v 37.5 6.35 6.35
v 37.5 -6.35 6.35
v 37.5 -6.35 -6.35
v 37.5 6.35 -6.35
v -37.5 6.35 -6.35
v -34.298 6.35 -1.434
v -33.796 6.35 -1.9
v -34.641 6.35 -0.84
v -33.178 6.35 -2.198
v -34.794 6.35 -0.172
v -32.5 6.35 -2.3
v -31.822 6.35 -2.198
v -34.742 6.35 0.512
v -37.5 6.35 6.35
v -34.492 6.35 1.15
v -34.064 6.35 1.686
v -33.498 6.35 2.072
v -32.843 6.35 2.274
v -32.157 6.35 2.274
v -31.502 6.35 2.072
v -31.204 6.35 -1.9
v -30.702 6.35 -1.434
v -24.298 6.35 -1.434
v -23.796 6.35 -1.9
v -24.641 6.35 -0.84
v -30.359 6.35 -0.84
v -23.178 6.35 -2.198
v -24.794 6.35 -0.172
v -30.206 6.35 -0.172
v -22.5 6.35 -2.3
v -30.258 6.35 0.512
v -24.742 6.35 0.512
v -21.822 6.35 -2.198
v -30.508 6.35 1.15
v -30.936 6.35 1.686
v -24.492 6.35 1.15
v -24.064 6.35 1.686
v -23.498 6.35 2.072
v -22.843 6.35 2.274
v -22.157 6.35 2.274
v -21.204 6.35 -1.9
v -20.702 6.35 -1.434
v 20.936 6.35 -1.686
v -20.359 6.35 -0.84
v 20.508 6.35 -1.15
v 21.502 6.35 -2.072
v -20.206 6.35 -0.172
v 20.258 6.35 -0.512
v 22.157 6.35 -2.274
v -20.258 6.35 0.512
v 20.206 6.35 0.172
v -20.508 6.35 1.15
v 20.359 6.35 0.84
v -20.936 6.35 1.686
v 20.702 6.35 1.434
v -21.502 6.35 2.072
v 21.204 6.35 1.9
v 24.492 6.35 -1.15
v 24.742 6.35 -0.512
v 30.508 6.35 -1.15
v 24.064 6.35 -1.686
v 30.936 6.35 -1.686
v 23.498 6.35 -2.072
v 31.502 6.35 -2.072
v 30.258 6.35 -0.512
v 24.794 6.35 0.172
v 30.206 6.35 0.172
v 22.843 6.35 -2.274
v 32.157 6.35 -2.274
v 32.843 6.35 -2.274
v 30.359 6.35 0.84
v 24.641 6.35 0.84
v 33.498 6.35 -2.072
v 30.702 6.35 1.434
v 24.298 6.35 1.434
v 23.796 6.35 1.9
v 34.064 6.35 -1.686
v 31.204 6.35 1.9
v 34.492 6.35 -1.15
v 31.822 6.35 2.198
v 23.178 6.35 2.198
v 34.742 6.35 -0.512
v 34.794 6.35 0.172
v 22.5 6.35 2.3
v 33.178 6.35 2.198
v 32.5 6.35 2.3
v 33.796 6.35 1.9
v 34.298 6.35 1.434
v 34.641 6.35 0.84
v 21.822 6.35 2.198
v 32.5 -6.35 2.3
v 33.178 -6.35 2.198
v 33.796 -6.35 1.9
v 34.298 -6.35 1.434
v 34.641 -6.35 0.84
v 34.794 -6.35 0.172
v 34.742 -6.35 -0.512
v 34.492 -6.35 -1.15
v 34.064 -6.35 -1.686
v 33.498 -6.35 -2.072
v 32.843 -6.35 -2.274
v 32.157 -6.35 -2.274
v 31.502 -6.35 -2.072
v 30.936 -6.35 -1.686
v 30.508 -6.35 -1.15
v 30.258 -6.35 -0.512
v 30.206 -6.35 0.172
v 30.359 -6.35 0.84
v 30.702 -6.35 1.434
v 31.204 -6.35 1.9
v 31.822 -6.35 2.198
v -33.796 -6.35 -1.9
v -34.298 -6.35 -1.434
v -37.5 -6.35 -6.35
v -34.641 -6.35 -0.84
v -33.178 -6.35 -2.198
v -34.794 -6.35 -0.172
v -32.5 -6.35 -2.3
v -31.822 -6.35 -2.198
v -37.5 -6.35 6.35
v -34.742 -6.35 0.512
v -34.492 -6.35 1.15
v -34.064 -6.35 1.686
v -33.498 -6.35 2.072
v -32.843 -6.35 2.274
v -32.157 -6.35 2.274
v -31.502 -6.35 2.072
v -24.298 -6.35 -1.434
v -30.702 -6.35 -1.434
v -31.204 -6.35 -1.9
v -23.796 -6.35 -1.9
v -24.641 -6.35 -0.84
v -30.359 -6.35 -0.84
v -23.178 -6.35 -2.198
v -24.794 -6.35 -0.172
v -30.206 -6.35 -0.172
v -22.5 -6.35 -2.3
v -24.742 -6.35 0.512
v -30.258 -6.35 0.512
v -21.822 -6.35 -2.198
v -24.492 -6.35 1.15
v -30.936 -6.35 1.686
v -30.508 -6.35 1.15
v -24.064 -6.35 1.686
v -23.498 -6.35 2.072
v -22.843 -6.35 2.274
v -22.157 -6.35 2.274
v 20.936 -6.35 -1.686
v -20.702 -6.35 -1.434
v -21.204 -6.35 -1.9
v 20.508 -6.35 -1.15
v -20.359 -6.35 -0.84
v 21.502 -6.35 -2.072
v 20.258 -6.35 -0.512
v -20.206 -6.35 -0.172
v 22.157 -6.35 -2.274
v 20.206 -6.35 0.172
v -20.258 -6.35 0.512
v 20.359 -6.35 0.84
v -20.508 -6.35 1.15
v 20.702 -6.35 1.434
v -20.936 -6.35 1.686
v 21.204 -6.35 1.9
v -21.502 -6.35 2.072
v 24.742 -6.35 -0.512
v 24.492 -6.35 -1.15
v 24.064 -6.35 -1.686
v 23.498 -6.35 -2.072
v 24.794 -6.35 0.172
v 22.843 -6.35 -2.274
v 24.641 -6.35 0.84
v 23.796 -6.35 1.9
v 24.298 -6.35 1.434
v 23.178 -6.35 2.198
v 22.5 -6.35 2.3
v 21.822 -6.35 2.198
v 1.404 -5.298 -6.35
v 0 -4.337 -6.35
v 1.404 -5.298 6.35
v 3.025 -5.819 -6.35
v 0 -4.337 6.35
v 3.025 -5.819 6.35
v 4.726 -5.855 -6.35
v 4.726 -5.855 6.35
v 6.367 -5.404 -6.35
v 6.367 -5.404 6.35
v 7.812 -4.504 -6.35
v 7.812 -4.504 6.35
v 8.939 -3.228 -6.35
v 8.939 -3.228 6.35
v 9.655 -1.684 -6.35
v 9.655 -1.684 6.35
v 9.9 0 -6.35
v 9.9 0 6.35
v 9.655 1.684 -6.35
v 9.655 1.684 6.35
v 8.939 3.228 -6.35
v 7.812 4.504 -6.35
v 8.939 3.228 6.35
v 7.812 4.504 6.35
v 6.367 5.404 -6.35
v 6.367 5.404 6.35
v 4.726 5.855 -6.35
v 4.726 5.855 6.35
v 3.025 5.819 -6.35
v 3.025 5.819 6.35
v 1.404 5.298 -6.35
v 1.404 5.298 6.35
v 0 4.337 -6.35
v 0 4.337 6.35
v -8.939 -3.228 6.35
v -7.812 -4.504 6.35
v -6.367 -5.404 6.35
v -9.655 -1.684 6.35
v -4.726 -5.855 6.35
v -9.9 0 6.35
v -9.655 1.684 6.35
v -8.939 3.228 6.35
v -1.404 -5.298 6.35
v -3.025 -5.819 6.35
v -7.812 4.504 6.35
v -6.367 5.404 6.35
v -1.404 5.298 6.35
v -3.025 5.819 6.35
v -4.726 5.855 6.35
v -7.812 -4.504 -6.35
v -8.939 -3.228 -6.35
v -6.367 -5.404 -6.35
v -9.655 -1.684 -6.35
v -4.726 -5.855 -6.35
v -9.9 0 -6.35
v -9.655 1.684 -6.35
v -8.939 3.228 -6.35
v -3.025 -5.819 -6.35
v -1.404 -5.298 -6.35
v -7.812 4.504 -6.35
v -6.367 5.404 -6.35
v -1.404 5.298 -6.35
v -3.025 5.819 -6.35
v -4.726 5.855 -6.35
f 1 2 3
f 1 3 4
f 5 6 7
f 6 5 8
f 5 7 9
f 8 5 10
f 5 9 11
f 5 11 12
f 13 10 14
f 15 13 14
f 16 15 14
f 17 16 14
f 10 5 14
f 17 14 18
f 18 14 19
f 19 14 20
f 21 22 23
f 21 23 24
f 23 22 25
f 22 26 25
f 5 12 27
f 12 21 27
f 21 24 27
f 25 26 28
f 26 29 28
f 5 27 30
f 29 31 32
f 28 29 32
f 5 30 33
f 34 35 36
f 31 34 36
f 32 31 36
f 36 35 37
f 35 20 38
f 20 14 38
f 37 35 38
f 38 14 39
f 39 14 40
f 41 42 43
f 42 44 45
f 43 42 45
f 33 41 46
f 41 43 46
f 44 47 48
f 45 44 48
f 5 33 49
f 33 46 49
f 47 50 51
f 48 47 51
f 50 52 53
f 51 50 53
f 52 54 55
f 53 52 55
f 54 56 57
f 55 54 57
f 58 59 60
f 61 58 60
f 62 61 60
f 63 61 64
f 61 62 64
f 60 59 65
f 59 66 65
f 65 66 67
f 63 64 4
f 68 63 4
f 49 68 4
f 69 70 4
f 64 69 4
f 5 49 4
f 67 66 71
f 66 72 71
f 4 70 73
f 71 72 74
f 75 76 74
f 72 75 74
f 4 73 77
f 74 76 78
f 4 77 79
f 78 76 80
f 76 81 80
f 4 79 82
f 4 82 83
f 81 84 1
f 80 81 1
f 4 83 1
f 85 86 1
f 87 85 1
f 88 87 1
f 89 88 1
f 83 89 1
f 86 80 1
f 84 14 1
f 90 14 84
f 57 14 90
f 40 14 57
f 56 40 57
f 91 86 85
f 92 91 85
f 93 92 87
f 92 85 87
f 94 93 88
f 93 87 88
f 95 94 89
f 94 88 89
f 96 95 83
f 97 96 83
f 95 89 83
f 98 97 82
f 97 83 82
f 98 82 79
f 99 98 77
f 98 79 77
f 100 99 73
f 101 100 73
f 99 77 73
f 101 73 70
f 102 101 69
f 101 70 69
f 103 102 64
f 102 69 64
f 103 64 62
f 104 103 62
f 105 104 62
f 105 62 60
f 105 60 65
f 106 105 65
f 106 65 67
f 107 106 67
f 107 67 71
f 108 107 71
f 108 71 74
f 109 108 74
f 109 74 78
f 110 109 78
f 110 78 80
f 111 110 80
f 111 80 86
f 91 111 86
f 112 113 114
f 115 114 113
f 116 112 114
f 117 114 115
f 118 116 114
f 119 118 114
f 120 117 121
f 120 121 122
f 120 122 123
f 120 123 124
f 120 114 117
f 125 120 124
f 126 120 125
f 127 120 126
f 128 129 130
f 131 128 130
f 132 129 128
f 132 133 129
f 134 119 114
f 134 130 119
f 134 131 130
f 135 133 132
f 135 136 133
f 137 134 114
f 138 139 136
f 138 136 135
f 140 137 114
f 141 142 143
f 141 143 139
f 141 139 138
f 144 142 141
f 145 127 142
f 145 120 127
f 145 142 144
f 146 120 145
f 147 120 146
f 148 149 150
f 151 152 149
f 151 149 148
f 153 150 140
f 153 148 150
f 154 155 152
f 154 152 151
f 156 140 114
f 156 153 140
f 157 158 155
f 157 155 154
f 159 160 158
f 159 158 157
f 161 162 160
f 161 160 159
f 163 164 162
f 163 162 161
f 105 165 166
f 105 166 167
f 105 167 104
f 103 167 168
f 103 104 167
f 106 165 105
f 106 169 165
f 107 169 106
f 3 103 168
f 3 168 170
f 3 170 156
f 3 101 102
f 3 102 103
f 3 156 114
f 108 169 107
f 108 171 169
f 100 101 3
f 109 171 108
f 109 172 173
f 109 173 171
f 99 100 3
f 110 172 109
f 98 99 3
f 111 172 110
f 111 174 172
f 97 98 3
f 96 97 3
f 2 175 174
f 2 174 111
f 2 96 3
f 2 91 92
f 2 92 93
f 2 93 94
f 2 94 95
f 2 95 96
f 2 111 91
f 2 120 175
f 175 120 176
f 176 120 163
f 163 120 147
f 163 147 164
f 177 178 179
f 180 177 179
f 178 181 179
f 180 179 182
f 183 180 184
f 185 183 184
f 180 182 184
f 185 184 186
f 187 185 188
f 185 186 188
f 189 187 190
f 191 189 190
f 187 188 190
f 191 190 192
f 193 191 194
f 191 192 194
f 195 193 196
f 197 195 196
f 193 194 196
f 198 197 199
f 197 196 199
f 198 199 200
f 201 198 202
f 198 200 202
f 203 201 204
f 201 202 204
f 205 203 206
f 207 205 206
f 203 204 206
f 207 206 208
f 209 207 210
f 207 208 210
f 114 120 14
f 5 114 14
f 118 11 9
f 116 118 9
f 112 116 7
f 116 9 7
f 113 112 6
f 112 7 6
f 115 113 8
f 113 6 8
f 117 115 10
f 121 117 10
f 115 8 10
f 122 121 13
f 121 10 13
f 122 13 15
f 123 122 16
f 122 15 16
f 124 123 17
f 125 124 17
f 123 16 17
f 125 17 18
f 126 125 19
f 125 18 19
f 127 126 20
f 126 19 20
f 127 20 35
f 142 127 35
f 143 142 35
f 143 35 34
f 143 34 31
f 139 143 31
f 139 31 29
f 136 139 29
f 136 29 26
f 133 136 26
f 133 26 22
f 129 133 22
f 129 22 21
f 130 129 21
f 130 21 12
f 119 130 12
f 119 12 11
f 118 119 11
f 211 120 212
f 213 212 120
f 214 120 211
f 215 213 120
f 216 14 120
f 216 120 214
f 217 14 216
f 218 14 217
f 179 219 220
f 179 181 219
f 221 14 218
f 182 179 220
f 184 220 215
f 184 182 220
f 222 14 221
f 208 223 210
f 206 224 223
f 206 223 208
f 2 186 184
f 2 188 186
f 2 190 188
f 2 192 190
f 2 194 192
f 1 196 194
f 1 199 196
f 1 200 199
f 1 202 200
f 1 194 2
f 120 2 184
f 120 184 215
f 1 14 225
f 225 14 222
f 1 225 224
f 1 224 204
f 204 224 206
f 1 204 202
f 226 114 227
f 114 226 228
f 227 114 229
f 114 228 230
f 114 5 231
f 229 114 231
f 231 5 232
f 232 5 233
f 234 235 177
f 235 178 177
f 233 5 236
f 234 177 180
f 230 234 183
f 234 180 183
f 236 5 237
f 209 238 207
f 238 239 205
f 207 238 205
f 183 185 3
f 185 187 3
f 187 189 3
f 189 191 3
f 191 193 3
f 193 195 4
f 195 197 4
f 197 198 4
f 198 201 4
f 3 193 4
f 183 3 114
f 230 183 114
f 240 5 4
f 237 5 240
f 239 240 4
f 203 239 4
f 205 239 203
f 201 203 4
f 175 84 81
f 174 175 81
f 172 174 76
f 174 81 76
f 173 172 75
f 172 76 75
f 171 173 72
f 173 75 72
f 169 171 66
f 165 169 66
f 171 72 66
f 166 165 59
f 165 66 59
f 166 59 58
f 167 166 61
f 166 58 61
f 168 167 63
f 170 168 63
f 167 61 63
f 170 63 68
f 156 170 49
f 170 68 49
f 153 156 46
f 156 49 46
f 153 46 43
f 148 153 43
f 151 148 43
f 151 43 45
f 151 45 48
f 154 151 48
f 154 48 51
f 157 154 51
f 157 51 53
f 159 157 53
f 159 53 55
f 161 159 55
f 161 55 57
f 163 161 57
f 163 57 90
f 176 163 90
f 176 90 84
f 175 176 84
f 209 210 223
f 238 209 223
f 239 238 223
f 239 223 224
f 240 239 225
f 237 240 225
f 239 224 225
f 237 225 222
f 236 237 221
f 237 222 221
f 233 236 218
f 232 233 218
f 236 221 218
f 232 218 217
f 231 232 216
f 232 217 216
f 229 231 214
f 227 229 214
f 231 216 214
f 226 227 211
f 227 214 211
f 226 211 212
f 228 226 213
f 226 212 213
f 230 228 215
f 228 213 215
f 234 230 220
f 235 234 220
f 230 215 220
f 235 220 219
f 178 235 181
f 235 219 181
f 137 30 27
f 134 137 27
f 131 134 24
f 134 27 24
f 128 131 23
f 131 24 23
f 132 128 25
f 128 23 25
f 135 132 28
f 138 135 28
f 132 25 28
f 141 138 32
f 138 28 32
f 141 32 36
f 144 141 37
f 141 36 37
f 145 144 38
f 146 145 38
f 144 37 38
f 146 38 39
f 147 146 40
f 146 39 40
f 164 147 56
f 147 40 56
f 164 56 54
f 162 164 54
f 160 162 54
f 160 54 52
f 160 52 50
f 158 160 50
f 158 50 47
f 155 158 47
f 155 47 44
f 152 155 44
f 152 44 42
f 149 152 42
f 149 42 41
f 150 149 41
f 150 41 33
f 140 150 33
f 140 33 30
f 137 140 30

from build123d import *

# Parameters (mm, degrees)
CROQUIS2_W              = 75
CROQUIS2_H              = 12.7
SALIENTE_EXTRUIR1_DEPTH = 6.35
CROQUIS3_R              = 2.3
CORTAR_EXTRUIR1_DEPTH   = 41.098160806


with BuildPart() as part:
    # Croquis2 → Saliente-Extruir1 (new, symmetric)
    with BuildSketch(Plane.XY):
        Rectangle(CROQUIS2_W, CROQUIS2_H)
        with BuildLine():
            ThreePointArc((0, 4.337049688), (-9.9, 0), (0, -4.337049688))
            ThreePointArc((0, -4.337049688), (9.9, 0), (0, 4.337049688))
        make_face(mode=Mode.SUBTRACT)
    extrude(amount=SALIENTE_EXTRUIR1_DEPTH, both=True)

    # Croquis3 → Cortar-Extruir1 (cut, through all)
    with BuildSketch(Plane(origin=(0, 6.35, 0), x_dir=(1, 0, 0), z_dir=(0, 1, 0))):
        with Locations(Location((32.5, 0, 0), (0, 0, 270))):
            Circle(CROQUIS3_R)
        with Locations(Location((22.5, 0, 0), (0, 0, 270))):
            Circle(CROQUIS3_R)
        with Locations(Location((-32.5, 0, 0), (0, 0, 90))):
            Circle(CROQUIS3_R)
        with Locations(Location((-22.5, 0, 0), (0, 0, 90))):
            Circle(CROQUIS3_R)
    extrude(amount=-CORTAR_EXTRUIR1_DEPTH, mode=Mode.SUBTRACT)


solid = part.part
